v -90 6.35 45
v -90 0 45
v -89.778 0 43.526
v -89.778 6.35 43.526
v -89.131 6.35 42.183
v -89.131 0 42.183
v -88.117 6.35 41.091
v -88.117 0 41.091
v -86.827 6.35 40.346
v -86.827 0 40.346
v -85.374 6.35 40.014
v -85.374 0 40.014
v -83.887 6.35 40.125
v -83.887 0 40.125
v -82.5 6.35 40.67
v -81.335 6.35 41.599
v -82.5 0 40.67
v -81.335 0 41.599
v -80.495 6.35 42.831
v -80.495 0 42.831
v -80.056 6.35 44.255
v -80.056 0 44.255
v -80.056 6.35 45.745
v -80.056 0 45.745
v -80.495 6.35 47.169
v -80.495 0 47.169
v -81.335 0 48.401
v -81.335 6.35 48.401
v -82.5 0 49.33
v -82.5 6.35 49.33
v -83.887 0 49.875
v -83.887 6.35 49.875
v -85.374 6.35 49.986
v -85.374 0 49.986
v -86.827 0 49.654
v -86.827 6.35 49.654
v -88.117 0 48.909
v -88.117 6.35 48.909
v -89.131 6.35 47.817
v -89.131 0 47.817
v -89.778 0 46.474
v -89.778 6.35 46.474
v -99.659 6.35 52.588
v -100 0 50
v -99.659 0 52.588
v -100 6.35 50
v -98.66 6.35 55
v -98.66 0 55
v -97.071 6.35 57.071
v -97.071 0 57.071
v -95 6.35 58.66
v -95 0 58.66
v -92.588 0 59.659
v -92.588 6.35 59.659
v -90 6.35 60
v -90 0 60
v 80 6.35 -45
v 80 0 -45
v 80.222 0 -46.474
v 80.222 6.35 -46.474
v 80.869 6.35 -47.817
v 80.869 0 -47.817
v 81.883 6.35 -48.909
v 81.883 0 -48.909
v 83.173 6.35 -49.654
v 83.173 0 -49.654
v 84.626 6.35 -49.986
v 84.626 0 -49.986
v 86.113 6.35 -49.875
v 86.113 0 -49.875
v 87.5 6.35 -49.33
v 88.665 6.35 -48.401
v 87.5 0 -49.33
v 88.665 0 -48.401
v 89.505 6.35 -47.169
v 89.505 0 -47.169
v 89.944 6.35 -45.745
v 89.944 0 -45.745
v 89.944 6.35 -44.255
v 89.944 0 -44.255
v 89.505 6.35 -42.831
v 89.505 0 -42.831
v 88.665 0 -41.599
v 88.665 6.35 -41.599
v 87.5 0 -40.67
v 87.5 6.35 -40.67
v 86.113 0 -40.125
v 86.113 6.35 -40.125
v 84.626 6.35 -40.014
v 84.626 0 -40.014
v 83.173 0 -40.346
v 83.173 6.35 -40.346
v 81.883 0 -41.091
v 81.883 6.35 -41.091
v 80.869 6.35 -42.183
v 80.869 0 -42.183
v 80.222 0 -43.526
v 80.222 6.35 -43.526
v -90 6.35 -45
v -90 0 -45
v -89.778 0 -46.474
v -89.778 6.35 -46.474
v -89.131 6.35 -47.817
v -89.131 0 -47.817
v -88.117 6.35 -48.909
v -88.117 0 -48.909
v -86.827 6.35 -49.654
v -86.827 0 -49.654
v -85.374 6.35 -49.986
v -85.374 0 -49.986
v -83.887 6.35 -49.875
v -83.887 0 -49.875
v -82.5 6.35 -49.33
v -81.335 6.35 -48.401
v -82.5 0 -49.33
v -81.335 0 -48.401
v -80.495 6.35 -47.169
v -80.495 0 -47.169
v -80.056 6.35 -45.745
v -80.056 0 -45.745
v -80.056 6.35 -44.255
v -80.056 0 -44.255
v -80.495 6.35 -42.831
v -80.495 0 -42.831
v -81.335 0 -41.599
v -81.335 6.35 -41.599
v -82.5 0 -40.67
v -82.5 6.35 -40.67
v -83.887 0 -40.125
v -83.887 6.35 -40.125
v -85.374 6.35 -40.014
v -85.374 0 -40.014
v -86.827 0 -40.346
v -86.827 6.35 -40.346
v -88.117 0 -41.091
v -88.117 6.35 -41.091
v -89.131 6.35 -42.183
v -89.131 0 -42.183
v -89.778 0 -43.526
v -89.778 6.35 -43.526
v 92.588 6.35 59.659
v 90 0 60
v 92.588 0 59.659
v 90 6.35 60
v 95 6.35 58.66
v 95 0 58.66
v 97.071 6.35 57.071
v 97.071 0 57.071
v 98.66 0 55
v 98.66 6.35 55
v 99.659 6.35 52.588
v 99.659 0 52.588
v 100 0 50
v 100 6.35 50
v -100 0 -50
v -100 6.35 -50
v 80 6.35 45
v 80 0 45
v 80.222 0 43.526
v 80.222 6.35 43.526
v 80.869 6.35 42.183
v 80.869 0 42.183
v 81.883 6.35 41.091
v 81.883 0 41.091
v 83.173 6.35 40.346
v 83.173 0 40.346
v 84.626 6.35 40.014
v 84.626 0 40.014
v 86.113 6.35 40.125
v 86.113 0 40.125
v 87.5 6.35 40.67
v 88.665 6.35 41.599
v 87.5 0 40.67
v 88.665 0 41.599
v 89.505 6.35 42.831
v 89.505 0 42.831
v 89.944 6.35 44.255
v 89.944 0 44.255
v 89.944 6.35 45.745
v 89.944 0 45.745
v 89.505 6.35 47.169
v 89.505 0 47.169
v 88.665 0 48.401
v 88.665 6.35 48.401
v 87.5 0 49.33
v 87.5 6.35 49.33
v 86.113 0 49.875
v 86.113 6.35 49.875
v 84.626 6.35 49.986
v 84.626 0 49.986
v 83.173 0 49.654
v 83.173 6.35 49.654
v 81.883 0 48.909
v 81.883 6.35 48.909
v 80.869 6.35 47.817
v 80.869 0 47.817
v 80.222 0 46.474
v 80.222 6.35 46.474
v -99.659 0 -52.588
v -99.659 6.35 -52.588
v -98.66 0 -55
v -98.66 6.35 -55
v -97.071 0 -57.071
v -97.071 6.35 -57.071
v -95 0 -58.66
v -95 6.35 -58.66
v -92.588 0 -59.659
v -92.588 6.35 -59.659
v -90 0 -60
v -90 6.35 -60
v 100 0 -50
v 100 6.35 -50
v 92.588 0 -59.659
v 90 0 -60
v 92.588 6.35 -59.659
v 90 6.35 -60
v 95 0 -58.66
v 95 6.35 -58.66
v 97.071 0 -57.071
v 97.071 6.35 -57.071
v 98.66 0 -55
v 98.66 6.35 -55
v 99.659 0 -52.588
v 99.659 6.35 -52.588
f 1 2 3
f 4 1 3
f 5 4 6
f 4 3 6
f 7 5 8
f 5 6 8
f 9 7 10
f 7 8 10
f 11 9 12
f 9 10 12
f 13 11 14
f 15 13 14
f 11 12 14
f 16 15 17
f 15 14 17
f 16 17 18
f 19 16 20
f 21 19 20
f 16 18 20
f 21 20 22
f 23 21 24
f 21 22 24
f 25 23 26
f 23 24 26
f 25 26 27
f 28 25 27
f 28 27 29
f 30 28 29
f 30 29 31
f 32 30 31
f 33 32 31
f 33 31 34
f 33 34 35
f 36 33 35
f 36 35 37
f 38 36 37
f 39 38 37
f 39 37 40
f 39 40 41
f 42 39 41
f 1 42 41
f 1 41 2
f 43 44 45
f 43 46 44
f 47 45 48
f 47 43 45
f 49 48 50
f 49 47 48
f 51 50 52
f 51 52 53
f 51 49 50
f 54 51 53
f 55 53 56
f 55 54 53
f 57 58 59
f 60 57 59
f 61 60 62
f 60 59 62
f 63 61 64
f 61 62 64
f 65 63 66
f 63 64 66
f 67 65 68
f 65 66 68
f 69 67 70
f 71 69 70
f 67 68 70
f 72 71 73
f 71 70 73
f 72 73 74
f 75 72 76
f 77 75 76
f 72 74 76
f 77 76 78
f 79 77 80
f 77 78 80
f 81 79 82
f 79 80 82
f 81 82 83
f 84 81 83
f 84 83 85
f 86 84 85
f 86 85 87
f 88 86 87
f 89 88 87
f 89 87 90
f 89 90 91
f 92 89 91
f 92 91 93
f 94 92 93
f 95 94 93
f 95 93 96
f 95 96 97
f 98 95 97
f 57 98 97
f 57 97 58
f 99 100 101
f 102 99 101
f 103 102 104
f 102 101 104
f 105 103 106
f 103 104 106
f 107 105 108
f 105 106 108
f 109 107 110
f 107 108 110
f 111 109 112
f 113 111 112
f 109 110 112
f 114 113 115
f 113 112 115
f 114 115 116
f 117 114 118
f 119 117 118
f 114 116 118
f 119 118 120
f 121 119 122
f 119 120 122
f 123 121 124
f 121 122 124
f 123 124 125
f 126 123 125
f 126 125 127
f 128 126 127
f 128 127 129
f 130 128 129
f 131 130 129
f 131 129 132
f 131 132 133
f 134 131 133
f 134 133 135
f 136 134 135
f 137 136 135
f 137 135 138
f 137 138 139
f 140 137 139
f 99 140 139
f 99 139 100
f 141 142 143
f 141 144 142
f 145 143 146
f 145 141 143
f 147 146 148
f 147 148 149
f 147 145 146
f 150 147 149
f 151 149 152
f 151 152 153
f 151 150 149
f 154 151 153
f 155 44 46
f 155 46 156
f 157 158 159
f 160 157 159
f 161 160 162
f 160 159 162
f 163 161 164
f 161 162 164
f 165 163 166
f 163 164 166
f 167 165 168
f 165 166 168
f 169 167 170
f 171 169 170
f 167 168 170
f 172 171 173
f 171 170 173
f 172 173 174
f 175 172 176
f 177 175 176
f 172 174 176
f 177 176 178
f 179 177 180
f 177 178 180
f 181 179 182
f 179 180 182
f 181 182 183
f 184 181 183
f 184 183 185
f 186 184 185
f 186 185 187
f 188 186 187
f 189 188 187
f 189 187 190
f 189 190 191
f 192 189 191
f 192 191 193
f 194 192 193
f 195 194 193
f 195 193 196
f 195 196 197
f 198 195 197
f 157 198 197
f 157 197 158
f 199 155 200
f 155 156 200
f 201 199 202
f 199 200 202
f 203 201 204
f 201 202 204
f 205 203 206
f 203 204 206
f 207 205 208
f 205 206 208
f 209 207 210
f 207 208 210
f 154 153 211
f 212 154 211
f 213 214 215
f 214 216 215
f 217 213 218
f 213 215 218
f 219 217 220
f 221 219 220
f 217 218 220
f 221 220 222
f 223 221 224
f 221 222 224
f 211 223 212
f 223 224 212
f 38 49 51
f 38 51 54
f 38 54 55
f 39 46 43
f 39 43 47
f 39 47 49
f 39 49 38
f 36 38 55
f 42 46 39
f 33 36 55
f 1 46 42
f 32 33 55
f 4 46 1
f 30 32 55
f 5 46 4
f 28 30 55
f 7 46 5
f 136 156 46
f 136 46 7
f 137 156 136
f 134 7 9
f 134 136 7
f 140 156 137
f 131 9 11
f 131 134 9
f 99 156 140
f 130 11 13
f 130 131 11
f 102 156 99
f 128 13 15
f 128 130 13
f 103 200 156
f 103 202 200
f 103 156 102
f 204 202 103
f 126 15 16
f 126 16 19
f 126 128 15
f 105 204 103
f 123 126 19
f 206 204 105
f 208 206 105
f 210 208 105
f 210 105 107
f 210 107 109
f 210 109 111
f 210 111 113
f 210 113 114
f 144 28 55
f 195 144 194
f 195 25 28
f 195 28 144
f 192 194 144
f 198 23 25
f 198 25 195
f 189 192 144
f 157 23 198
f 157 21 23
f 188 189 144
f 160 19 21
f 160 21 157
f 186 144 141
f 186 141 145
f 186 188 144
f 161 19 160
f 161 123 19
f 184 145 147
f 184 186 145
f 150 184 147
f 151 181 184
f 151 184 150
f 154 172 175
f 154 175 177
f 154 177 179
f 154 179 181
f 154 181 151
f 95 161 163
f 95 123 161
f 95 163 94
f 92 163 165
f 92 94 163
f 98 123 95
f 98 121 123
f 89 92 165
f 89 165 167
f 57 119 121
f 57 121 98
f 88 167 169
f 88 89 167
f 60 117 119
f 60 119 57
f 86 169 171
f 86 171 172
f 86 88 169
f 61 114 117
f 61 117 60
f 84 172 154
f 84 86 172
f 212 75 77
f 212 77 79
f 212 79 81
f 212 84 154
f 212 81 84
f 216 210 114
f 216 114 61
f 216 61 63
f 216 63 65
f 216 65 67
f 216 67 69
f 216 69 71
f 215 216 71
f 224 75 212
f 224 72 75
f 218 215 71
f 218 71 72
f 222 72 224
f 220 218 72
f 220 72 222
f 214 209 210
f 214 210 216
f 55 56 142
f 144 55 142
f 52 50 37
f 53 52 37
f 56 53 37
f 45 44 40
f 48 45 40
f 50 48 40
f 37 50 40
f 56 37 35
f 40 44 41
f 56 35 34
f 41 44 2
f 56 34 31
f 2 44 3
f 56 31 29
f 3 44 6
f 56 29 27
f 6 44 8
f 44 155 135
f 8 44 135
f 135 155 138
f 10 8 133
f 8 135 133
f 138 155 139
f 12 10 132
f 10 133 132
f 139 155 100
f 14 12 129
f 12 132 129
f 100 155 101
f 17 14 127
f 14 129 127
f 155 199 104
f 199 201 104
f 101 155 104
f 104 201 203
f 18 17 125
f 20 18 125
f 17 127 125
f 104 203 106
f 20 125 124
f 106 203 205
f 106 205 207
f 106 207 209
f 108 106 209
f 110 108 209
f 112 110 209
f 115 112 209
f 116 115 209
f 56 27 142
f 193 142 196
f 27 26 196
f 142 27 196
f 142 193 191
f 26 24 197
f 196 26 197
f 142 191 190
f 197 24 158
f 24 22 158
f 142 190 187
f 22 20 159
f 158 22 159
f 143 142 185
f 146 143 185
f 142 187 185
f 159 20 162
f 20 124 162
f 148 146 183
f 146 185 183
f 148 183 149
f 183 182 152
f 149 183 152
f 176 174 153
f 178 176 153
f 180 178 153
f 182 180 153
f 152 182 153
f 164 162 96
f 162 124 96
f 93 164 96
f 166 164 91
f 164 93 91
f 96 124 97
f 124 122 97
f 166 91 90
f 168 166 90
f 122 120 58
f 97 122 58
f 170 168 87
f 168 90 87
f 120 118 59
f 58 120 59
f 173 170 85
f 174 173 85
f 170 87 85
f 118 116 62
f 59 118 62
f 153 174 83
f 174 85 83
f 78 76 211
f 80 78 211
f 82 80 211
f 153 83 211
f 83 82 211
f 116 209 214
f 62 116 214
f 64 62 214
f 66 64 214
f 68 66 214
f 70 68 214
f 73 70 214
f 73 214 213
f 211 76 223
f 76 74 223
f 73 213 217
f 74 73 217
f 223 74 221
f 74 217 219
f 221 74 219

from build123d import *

# Parameters (mm, degrees)
ESQUISSE1_W                     = 200
ESQUISSE1_H                     = 120
BOSS_EXTRU_1_DEPTH              = 6.35
DIAM_TRE_DU_PER_AGE_10_0_10_1_D = 10
CONG_1_R                        = 10


with BuildPart() as part:
    # Esquisse1 → Boss.-Extru.1 (new body)
    with BuildSketch(Plane(origin=(0, 0, 0), x_dir=(1, 0, 0), z_dir=(0, 1, 0))):
        Rectangle(ESQUISSE1_W, ESQUISSE1_H)
    extrude(amount=BOSS_EXTRU_1_DEPTH)

    # Diamètre du perçage Ø10.0 (10)1 (through all)
    with Locations(Plane(origin=(0, 6.35, 0), x_dir=(1, 0, 0), z_dir=(0, 1, 0))):
        with Locations((-85, 45), (-85, -45), (85, -45), (85, 45)):
            Hole(DIAM_TRE_DU_PER_AGE_10_0_10_1_D / 2)

    # Congé1
    cong_1_edges = [part.edges().sort_by_distance(p)[0] for p in [
        (100, 3.175, 60),
        (-100, 3.175, 60),
        (-100, 3.175, -60),
        (100, 3.175, -60),
    ]]
    fillet(cong_1_edges, radius=CONG_1_R)


solid = part.part
